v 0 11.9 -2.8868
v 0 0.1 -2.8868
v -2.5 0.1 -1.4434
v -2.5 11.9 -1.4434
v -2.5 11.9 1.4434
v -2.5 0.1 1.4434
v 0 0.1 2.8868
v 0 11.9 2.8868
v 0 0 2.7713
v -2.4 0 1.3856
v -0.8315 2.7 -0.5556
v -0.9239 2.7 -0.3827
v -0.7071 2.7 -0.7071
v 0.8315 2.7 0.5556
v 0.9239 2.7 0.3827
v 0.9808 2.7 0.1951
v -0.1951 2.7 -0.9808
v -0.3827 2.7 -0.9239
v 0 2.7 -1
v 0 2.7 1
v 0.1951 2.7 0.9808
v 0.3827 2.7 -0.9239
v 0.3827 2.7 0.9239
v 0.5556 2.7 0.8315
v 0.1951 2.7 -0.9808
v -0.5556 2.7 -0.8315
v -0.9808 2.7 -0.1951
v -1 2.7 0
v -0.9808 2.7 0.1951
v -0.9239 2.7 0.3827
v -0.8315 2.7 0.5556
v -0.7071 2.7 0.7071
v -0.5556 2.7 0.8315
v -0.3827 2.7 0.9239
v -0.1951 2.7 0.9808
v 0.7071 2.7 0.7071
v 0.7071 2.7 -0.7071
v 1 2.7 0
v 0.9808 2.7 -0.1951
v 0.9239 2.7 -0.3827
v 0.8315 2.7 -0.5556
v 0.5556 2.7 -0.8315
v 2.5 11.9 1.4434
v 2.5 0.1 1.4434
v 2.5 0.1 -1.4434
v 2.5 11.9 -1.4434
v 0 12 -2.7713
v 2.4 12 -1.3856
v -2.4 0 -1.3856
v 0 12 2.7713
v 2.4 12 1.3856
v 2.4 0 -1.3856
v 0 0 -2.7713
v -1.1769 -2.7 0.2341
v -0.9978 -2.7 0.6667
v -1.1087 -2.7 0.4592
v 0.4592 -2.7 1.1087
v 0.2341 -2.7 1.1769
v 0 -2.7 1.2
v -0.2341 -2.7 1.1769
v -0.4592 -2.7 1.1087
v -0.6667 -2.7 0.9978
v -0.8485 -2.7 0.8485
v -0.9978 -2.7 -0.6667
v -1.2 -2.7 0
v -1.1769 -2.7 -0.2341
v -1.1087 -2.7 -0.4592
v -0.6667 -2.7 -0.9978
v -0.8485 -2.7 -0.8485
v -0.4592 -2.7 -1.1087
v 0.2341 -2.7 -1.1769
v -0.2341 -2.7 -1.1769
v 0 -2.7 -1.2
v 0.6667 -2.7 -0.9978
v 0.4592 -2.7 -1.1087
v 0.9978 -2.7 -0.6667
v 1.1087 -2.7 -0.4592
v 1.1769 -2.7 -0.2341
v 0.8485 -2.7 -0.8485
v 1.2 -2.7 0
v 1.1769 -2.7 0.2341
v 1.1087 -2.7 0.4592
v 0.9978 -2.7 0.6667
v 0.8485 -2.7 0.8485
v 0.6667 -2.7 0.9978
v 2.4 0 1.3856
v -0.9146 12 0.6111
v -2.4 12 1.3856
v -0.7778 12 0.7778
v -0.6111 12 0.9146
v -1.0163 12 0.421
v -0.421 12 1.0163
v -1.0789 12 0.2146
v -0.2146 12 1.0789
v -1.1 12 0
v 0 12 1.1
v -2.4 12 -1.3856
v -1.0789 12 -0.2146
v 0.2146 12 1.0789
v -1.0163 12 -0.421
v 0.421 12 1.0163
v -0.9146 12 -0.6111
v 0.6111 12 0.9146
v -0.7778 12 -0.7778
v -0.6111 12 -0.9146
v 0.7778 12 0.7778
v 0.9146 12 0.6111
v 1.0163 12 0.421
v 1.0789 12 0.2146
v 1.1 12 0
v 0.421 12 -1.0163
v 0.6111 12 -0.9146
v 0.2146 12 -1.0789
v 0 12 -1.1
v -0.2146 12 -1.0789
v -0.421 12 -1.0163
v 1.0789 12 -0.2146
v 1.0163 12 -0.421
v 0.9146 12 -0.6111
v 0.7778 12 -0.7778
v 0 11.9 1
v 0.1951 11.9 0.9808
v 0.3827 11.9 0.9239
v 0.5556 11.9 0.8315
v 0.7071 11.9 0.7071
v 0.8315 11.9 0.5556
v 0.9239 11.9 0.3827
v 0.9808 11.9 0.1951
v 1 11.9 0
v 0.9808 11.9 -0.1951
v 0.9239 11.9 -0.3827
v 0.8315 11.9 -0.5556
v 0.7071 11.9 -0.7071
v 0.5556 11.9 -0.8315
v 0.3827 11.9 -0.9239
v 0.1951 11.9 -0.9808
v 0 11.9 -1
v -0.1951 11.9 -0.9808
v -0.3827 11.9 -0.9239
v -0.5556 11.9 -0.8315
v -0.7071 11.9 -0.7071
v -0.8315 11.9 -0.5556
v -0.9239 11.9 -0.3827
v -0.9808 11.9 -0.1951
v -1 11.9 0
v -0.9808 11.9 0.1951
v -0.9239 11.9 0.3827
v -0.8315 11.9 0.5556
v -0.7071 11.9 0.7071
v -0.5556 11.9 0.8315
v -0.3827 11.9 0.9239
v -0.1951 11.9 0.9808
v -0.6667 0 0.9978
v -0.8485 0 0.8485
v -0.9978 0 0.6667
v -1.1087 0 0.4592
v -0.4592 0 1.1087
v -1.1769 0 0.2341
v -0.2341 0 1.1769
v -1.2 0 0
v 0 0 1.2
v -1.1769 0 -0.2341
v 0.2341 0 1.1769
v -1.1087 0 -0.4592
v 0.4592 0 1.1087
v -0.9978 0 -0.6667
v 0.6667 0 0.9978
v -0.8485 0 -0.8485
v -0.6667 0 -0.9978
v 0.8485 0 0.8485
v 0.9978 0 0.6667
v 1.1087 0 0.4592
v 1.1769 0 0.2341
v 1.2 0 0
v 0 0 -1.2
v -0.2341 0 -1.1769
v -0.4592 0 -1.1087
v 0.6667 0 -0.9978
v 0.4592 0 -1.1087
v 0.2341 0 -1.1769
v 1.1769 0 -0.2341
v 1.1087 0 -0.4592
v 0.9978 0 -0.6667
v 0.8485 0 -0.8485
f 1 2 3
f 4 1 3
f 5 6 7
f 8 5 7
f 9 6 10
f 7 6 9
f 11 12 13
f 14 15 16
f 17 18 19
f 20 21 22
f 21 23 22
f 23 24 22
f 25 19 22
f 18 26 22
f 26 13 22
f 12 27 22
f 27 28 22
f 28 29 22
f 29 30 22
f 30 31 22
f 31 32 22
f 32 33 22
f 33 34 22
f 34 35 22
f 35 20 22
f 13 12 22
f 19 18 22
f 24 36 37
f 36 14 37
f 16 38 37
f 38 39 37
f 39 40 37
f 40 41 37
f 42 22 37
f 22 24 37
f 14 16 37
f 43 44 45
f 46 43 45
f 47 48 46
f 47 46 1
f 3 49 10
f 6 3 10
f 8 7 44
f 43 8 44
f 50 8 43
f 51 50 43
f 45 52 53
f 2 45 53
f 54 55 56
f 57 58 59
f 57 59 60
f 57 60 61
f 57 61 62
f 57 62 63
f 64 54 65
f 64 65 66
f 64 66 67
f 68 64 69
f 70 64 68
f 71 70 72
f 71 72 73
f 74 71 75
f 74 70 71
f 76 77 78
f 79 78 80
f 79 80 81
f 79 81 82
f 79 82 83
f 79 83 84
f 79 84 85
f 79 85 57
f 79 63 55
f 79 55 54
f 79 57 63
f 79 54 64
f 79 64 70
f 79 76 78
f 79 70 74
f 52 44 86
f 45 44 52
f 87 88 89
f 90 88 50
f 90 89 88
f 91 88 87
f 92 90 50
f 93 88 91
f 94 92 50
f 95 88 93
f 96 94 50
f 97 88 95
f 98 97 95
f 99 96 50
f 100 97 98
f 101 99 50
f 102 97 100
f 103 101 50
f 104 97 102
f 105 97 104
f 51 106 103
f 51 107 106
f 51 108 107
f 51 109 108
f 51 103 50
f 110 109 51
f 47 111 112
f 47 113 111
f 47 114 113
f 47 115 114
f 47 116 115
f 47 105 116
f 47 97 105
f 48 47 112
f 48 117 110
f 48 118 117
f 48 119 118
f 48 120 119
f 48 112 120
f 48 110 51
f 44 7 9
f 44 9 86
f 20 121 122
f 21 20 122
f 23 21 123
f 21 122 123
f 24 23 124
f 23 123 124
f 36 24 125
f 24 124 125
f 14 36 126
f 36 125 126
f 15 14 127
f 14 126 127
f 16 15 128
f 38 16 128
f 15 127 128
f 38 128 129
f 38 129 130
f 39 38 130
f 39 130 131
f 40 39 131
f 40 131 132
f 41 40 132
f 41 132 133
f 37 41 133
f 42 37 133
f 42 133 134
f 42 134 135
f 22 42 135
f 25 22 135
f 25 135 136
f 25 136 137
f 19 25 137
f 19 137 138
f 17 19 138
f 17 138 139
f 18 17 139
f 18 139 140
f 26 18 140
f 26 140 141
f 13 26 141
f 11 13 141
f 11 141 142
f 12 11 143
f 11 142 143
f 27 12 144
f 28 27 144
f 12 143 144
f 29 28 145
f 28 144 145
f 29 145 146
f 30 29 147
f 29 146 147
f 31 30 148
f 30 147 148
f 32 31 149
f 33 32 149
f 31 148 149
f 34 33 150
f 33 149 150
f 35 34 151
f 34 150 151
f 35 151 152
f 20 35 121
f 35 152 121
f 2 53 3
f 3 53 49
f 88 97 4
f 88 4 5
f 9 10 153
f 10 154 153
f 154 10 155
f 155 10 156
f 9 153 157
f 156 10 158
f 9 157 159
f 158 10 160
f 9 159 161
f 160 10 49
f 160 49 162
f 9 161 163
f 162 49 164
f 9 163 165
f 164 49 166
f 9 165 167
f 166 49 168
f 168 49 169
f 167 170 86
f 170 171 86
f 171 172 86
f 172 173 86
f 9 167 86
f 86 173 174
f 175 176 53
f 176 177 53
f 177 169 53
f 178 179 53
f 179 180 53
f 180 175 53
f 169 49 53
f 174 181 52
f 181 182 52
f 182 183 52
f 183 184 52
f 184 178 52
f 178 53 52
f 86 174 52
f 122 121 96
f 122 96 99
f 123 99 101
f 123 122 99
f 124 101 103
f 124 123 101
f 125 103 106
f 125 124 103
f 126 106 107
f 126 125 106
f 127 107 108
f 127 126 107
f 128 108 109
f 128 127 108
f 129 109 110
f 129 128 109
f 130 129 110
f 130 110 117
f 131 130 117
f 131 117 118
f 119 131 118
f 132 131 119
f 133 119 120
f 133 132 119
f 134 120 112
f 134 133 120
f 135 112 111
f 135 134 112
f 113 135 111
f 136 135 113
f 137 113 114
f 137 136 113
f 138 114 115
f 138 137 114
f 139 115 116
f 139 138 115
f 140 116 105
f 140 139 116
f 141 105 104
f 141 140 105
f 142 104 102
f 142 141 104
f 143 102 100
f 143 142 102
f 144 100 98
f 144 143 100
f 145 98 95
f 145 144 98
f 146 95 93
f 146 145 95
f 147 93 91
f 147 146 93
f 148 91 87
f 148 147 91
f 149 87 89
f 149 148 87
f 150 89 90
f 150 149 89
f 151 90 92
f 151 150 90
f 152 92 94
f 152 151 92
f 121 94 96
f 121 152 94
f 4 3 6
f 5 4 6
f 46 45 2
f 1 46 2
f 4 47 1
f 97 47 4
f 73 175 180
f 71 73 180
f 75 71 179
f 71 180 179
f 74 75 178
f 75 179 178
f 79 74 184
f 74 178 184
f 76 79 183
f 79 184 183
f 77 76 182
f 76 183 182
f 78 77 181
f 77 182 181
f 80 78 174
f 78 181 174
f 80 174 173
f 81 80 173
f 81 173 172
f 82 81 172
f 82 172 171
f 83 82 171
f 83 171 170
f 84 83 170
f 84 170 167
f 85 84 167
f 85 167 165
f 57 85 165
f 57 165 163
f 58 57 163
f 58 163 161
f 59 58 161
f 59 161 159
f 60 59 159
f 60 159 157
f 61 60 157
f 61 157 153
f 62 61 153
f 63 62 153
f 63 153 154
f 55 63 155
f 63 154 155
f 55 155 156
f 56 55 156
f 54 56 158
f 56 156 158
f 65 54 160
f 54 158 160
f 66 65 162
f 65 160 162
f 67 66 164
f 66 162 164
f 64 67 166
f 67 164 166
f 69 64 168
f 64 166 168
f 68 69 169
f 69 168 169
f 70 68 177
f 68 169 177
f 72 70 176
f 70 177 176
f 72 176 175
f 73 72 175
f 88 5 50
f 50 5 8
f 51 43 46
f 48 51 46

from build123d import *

# Parameters (mm, degrees)
BOSS_EXTRUDE1_DEPTH      = 12
SKETCH2_R                = 1
CUT_EXTRUDE1_DEPTH       = 13.592987467
CHAMFER1_SIZE            = 0.1
BOSS_EXTRUDE2_DEPTH      = 2.7
BOSS_EXTRUDE2_DEPTH_BACK = 2.7
SKETCH3_R                = 1.2


with BuildPart() as part:
    # Sketch1 → Boss-Extrude1 (new body)
    with BuildSketch(Plane(origin=(0, 0, 0), x_dir=(1, 0, 0), z_dir=(0, 1, 0))):
        Polygon((0, 2.886751346), (-2.5, 1.443375673), (-2.5, -1.443375673), (0, -2.886751346), (2.5, -1.443375673), (2.5, 1.443375673), align=None)
    extrude(amount=BOSS_EXTRUDE1_DEPTH)

    # Sketch2 → Cut-Extrude1 (cut, through all)
    with BuildSketch(Plane(origin=(0, 12, 0), x_dir=(1, 0, 0), z_dir=(0, 1, 0))):
        with Locations(Location((0, 0, 0), (0, 0, 270))):
            Circle(SKETCH2_R)
    extrude(amount=-CUT_EXTRUDE1_DEPTH, mode=Mode.SUBTRACT)

    # Chamfer1
    chamfer1_edges = [part.edges().sort_by_distance(p)[0] for p in [
        (-2.5, 12, 0),
        (-1.25, 12, 2.165063509),
        (1.25, 12, 2.165063509),
        (2.5, 12, 0),
        (0, 12, -1),
        (1.25, 12, -2.165063509),
        (2.5, 0, 0),
        (1.25, 0, 2.165063509),
        (-1.25, 0, 2.165063509),
        (-1.25, 12, -2.165063509),
        (-2.5, 0, 0),
        (-1.25, 0, -2.165063509),
        (1.25, 0, -2.165063509),
    ]]
    chamfer(chamfer1_edges, length=CHAMFER1_SIZE)

    # Sketch3 → Boss-Extrude2 (add, two sides: drawn at the far end of the back side and taken through both)
    with BuildSketch(Plane.XZ.offset(-BOSS_EXTRUDE2_DEPTH_BACK)):
        with Locations(Location((0, 0, 0), (0, 0, 270))):
            Circle(SKETCH3_R)
    extrude(amount=BOSS_EXTRUDE2_DEPTH + BOSS_EXTRUDE2_DEPTH_BACK)


solid = part.part
